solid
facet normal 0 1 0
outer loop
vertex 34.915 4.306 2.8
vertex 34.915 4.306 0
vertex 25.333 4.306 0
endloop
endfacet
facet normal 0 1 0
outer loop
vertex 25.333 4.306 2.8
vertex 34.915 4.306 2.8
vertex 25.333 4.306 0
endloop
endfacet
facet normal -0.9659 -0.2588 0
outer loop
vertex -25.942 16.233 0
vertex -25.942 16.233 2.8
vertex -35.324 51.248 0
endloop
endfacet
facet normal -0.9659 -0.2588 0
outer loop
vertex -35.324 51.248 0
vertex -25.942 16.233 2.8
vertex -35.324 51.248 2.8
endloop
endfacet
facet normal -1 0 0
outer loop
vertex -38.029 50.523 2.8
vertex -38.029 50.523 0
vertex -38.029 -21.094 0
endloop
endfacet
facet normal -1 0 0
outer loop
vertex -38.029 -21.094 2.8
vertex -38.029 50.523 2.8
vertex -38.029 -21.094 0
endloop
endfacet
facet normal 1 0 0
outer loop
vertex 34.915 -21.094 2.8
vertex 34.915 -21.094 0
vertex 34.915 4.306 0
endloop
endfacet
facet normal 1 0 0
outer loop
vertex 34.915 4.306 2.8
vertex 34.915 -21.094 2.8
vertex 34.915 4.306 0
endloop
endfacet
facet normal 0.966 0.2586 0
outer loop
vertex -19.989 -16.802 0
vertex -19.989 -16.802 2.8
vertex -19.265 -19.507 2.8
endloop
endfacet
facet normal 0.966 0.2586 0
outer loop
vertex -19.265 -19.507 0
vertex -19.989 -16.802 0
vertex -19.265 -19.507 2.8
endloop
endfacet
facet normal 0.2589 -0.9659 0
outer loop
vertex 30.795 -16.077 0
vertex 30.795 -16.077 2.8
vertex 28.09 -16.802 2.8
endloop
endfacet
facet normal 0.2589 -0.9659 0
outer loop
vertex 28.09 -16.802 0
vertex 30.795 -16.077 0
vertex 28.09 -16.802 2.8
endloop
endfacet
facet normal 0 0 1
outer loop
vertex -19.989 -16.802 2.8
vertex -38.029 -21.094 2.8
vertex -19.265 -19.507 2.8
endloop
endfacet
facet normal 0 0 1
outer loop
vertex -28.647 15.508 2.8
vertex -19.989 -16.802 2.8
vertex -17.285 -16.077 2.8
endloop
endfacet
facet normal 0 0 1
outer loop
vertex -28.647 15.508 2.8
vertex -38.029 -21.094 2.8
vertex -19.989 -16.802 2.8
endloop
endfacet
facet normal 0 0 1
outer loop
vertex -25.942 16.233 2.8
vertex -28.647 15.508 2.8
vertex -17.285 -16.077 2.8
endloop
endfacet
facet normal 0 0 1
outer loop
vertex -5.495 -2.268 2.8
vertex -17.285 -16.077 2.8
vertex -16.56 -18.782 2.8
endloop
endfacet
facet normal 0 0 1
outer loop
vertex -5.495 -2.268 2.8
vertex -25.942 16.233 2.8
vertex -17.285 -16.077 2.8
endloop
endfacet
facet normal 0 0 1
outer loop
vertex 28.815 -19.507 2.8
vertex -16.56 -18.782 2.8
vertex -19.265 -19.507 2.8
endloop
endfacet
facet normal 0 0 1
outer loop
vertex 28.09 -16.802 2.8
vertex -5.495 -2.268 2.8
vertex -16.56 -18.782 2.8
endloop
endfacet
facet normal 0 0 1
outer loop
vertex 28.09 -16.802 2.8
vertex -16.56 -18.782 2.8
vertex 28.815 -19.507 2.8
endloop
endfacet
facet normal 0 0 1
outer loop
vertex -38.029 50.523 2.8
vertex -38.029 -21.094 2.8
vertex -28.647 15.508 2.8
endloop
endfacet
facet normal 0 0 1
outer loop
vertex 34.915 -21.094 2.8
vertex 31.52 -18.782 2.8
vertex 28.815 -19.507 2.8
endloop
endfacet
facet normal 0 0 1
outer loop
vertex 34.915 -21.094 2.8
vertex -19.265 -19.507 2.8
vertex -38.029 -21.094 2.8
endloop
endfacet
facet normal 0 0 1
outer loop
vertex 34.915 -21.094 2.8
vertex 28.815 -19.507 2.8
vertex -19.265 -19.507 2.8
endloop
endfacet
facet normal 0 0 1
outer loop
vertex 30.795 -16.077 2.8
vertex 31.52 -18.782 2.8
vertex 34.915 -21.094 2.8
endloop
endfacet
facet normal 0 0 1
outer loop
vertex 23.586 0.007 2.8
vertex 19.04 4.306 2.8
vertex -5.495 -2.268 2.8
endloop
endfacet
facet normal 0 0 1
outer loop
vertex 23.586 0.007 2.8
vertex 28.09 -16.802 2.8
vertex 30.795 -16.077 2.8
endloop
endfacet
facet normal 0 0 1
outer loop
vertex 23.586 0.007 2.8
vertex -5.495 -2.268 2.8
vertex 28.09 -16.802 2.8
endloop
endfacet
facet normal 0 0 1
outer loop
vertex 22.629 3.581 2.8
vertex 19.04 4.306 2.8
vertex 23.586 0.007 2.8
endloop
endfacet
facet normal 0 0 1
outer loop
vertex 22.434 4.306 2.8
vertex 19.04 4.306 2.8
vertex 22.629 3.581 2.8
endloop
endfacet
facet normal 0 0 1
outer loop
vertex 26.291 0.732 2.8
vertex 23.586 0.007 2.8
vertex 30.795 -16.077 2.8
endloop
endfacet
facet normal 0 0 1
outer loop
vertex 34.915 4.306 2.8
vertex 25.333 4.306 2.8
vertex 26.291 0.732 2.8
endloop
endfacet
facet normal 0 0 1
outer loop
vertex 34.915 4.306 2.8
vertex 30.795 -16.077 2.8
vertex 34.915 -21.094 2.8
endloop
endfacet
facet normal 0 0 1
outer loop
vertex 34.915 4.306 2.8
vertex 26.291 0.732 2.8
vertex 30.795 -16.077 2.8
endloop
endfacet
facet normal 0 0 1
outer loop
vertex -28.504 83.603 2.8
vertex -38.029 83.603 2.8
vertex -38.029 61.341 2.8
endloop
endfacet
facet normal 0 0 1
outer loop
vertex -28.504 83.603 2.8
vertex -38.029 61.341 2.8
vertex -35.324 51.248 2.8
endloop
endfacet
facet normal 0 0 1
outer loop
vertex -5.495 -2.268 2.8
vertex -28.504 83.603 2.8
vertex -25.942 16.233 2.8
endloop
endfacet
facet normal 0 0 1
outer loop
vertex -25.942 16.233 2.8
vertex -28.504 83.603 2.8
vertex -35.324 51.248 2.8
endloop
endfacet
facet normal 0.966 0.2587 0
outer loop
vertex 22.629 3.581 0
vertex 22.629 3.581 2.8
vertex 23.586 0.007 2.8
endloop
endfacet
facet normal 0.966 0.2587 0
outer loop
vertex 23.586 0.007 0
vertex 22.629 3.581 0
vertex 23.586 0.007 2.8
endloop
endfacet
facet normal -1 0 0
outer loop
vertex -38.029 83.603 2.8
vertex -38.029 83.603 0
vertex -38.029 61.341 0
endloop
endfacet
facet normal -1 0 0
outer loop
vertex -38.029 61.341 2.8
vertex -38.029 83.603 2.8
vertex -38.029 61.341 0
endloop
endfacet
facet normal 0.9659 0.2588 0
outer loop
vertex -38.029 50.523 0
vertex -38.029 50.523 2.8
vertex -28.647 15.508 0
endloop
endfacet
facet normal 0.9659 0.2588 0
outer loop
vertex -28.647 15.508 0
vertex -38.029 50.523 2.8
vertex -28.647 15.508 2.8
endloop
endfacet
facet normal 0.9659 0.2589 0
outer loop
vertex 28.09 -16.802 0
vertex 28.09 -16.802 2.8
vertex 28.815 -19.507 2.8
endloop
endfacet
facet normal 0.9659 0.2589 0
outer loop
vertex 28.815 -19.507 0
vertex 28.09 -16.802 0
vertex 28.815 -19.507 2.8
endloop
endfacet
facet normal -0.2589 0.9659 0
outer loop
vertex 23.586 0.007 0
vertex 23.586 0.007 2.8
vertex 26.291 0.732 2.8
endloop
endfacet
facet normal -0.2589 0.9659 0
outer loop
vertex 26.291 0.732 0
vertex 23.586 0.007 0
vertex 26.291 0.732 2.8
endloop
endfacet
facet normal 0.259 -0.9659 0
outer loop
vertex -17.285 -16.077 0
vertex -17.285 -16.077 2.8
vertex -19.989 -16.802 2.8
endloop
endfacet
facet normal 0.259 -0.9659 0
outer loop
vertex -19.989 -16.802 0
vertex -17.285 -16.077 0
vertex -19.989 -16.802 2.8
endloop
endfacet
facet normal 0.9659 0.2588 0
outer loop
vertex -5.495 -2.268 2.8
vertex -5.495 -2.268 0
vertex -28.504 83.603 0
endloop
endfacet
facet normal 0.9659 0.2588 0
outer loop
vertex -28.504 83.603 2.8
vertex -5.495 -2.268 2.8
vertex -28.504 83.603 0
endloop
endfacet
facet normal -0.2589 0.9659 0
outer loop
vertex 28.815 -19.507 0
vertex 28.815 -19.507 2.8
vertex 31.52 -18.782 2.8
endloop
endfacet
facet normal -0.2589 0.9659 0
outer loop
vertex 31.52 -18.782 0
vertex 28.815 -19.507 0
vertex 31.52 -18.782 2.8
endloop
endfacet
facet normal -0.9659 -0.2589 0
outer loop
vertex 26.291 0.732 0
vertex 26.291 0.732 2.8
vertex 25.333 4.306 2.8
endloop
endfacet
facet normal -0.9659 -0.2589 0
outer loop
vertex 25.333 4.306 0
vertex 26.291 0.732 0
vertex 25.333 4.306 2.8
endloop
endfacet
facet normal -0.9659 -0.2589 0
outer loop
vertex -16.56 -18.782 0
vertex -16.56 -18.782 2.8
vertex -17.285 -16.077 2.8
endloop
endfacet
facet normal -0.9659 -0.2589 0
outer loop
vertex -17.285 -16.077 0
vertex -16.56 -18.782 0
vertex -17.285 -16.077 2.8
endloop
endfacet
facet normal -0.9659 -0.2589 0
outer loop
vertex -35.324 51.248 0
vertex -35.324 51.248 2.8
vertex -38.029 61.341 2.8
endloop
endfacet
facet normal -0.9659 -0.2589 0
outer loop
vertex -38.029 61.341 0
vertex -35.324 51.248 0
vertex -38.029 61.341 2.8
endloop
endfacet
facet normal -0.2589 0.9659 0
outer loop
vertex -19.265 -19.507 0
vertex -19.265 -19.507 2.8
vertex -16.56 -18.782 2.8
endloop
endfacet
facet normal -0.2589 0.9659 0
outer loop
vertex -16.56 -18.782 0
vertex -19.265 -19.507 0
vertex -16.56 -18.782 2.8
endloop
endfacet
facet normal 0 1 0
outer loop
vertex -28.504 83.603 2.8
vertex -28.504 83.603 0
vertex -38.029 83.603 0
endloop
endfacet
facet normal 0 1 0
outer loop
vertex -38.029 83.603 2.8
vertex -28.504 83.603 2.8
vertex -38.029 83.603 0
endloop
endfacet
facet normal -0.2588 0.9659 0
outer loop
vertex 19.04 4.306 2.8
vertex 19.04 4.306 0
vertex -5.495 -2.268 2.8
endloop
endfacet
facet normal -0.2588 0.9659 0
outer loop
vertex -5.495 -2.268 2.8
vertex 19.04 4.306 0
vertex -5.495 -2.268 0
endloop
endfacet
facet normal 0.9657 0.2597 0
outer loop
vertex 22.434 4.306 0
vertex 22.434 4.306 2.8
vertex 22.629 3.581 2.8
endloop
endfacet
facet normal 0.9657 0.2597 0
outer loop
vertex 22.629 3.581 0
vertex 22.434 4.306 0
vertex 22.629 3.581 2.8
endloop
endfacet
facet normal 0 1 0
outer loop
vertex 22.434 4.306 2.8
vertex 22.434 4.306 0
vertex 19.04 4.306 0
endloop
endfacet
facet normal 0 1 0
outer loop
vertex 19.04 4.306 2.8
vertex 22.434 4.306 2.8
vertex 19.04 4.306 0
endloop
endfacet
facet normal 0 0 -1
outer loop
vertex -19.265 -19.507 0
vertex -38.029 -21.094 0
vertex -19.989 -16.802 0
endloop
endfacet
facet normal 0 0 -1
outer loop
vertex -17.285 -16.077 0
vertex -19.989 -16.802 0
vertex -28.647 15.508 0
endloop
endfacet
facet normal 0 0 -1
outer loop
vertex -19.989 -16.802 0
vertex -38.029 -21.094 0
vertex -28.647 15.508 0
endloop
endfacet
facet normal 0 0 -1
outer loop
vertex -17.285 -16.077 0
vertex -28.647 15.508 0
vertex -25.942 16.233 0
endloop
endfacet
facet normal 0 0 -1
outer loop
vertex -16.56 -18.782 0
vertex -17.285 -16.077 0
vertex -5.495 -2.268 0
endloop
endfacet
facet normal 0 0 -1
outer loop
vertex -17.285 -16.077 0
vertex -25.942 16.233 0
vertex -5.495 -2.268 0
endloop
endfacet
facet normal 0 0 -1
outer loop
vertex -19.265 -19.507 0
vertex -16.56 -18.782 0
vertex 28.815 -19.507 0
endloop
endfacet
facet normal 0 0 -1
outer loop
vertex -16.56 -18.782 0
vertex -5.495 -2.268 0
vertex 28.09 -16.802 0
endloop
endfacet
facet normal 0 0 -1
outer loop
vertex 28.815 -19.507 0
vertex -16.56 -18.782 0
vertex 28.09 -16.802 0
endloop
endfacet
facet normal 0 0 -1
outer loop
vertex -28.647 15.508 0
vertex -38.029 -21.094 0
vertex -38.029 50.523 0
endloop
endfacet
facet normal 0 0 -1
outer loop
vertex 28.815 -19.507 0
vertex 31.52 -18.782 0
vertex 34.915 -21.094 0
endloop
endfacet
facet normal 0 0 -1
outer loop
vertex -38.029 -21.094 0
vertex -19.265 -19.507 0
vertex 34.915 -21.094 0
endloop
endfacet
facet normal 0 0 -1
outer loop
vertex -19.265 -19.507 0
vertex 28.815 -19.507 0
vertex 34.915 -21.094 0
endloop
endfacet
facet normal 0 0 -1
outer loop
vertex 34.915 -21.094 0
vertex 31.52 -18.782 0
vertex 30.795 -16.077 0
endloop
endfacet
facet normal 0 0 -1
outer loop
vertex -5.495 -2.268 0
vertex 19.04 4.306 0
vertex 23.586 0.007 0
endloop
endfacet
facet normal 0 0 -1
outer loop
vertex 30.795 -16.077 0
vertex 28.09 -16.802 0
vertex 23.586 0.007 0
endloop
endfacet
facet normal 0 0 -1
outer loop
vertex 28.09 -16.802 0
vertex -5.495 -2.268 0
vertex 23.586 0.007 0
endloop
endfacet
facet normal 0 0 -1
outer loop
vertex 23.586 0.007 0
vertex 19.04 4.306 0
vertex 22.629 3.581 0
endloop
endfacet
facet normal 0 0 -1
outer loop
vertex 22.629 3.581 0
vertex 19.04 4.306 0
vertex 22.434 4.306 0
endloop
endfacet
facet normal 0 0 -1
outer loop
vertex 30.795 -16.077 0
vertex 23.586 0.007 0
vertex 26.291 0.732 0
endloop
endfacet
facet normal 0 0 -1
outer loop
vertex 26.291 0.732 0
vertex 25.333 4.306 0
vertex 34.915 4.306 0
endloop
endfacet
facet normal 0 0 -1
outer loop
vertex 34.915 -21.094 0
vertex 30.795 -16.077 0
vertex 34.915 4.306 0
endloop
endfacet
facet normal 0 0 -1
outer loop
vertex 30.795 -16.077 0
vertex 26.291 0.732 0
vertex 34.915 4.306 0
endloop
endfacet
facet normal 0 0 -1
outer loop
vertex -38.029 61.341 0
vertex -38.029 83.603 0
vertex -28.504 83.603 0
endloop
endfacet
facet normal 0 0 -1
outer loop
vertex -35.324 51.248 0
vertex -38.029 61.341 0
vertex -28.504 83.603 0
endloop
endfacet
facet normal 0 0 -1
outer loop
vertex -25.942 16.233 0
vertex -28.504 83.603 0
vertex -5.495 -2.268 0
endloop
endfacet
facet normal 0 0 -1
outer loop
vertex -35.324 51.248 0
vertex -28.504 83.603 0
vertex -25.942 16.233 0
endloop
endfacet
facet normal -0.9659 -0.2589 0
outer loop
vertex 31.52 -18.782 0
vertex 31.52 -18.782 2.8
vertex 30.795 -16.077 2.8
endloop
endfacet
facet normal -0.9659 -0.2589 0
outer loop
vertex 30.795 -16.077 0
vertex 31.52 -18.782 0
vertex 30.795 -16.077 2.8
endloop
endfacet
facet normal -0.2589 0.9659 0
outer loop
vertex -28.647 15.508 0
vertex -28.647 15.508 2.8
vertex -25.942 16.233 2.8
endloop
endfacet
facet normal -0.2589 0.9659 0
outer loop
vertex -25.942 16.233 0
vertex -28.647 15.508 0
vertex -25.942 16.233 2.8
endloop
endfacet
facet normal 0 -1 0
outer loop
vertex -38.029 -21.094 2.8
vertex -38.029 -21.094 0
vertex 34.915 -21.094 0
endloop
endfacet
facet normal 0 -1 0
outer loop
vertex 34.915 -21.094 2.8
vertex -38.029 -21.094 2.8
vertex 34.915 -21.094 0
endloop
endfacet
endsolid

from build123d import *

# Parameters (mm, degrees)
BOSS_EXTRUDE1_DEPTH = 2.8
CUT_EXTRUDE1_DEPTH  = 3.8
CUT_EXTRUDE2_DEPTH  = 3.8


with BuildPart() as part:
    # Sketch1 → Boss-Extrude1 (new body)
    with BuildSketch(Plane.XY):
        Polygon((-38.029024976, 83.602786166), (-38.029024976, -21.094016045), (34.914504121, -21.094016045), (34.914504121, 4.305983955), (19.039504121, 4.305983955), (-5.495011867, -2.268019791), (-28.504024976, 83.602786166), align=None)
    extrude(amount=BOSS_EXTRUDE1_DEPTH)

    # Sketch2 → Cut-Extrude1 (cut, through all)
    with BuildSketch(Plane.XY.offset(2.8)):
        Polygon((-19.264644206, -19.506516045), (-16.560051893, -18.781822719), (-17.284745219, -16.077230405), (-19.989337533, -16.801923732), align=None)
        Polygon((-28.646834591, 15.508295158), (-25.942242278, 16.232988484), (-35.324432663, 51.247799687), (-38.029024976, 61.341475615), (-38.029024976, 50.523106361), align=None)
    extrude(amount=-CUT_EXTRUDE1_DEPTH, mode=Mode.SUBTRACT)

    # Sketch3 → Cut-Extrude2 (cut, through all)
    with BuildSketch(Plane.XY.offset(2.8)):
        Polygon((28.814978037, -19.506516045), (31.51957035, -18.781822719), (30.794877024, -16.077230405), (28.09028471, -16.801923732), align=None)
        Polygon((23.58624935, 0.007365071), (26.290841664, 0.732058397), (25.333211197, 4.305983955), (22.434437892, 4.305983955), (22.628618883, 3.581290628), align=None)
    extrude(amount=-CUT_EXTRUDE2_DEPTH, mode=Mode.SUBTRACT)


solid = part.part
